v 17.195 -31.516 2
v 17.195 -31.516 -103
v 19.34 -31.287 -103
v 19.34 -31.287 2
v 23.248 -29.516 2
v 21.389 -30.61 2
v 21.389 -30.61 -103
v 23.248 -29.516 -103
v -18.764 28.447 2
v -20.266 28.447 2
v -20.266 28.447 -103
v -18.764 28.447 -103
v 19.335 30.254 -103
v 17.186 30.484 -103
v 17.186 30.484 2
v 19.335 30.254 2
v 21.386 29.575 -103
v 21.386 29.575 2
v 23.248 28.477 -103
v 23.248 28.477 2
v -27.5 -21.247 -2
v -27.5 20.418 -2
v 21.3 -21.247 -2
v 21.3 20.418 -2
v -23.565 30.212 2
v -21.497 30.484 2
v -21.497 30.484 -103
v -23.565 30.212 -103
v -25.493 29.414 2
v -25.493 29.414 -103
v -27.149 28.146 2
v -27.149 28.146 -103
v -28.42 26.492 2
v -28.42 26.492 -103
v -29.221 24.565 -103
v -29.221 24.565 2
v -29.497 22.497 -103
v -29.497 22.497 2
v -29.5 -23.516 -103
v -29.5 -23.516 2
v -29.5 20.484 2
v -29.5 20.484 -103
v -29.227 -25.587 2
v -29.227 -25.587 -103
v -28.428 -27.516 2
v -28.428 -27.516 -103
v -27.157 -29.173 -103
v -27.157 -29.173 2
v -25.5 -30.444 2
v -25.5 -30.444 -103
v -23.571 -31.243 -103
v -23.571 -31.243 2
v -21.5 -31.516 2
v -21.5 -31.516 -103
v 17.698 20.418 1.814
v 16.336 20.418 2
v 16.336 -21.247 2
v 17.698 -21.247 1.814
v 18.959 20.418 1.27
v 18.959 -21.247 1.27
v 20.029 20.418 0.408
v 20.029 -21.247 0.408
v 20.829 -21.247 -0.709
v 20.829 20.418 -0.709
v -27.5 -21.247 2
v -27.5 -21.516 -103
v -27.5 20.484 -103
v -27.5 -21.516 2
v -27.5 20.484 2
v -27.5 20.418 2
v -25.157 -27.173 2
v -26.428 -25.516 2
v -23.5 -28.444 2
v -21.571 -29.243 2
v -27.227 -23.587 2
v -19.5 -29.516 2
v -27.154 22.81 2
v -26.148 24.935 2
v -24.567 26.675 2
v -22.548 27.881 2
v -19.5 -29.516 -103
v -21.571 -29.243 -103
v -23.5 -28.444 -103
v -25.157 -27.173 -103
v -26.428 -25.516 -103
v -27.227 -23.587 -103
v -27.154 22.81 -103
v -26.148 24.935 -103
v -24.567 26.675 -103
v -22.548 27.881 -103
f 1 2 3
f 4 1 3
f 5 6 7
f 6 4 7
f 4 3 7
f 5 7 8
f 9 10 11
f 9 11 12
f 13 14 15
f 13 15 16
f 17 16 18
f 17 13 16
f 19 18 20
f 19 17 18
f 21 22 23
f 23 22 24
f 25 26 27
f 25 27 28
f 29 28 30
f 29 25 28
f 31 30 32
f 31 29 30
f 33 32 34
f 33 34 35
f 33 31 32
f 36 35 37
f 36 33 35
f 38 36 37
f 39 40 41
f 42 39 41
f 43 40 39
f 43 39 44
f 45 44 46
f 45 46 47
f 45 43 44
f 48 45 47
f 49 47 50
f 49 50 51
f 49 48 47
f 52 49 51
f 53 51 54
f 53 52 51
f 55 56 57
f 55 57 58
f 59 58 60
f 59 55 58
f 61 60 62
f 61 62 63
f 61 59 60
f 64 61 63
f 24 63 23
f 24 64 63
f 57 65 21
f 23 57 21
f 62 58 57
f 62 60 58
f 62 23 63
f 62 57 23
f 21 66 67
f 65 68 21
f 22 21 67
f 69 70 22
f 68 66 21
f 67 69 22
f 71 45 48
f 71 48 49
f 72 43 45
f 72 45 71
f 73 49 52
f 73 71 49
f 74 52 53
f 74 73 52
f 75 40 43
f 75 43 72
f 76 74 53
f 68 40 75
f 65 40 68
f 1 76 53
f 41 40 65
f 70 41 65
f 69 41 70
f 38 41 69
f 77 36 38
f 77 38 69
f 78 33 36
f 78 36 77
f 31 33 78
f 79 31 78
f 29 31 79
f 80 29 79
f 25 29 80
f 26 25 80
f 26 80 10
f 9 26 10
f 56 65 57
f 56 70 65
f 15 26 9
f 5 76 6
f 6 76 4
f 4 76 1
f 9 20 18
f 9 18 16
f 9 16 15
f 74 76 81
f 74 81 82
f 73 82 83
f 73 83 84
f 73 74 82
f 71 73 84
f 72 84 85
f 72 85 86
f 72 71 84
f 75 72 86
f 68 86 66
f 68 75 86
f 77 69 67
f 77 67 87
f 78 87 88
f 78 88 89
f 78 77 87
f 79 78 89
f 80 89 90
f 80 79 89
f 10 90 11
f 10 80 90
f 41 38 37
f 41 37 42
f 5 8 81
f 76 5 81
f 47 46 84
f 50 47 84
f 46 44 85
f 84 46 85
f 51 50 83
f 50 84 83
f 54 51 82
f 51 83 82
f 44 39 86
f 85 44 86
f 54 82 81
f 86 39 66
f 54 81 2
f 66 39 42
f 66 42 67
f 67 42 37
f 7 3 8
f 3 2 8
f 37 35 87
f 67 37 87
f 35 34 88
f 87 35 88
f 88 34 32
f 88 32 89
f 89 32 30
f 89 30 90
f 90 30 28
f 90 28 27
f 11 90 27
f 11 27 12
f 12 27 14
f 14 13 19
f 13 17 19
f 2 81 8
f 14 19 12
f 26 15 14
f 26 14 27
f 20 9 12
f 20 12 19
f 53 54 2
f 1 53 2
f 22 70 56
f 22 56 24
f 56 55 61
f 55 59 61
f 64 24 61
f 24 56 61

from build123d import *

# Parameters (mm, degrees)
F1_DEPTH    = 2
F2_DEPTH    = 103
F3_W        = 50.8
F3_H        = 41.6650772095
F4_DEPTH    = 2
F5_T1_DEPTH = 135.3099275981
F5_T3_DEPTH = 135.2654919008
F6_T1_DEPTH = 41.6650772095


# Not quite as in the source:
# - a fillet or chamfer that OpenCascade refuses, or shapes differently, is made with other operations: its cross-section is extruded or revolved along the edge and cut away or added
# - a feature names something its author has since deleted; it is built from what else it names


with BuildPart() as f1:
    # F0 (on Top) → F1 (new body)
    with BuildSketch(Plane.XY):
        with BuildLine():
            Line((23.2482, -29.5159982), (-19.5, -29.5159982))
            ThreePointArc((-19.5, -29.5159982), (-25.1568542495, -27.1728524495), (-27.5, -21.5159982))
            Line((-27.5, -21.5159982), (-27.5, 20.4840018))
            ThreePointArc((-27.5, 20.4840018), (-25.4213975047, 25.863318819), (-20.2657371023, 28.4472703934))
            Line((-20.2657371023, 28.4472703934), (-18.7638364732, 28.4472703934))
            Line((-18.7638364732, 28.4472703934), (23.2477635268, 28.4774018))
            Line((23.2477635268, 28.4774018), (23.2477635268, 30.4840018))
            Line((23.2477635268, 30.4840018), (-13.8766431592, 30.4840018))
            Line((-13.8766431592, 30.4840018), (-18.7638364732, 30.4840018))
            Line((-18.7638364732, 30.4840018), (-21.4966431592, 30.4840018))
            ThreePointArc((-21.4966431592, 30.4840018), (-27.1487639749, 28.1455855258), (-29.4966319659, 22.4973843711))
            Line((-29.4966319659, 22.4973843711), (-29.5, 20.4840018))
            Line((-29.5, 20.4840018), (-29.5, -21.5159982))
            Line((-29.5, -21.5159982), (-29.5, -23.5159982))
            ThreePointArc((-29.5, -23.5159982), (-27.1568542495, -29.1728524495), (-21.5, -31.5159982))
            Line((-21.5, -31.5159982), (-19.5, -31.5159982))
            Line((-19.5, -31.5159982), (23.2482, -31.5159982))
            Line((23.2482, -31.5159982), (23.2482, -29.5159982))
        make_face()
    extrude(amount=F1_DEPTH)

    # F0 (on Top) → F2 (join)
    with BuildSketch(Plane.XY):
        with BuildLine():
            Line((23.2482, -29.5159982), (-19.5, -29.5159982))
            ThreePointArc((-19.5, -29.5159982), (-25.1568542495, -27.1728524495), (-27.5, -21.5159982))
            Line((-27.5, -21.5159982), (-27.5, 20.4840018))
            ThreePointArc((-27.5, 20.4840018), (-25.4213975047, 25.863318819), (-20.2657371023, 28.4472703934))
            Line((-20.2657371023, 28.4472703934), (-18.7638364732, 28.4472703934))
            Line((-18.7638364732, 28.4472703934), (23.2477635268, 28.4774018))
            Line((23.2477635268, 28.4774018), (23.2477635268, 30.4840018))
            Line((23.2477635268, 30.4840018), (-13.8766431592, 30.4840018))
            Line((-13.8766431592, 30.4840018), (-18.7638364732, 30.4840018))
            Line((-18.7638364732, 30.4840018), (-21.4966431592, 30.4840018))
            ThreePointArc((-21.4966431592, 30.4840018), (-27.1487639749, 28.1455855258), (-29.4966319659, 22.4973843711))
            Line((-29.4966319659, 22.4973843711), (-29.5, 20.4840018))
            Line((-29.5, 20.4840018), (-29.5, -21.5159982))
            Line((-29.5, -21.5159982), (-29.5, -23.5159982))
            ThreePointArc((-29.5, -23.5159982), (-27.1568542495, -29.1728524495), (-21.5, -31.5159982))
            Line((-21.5, -31.5159982), (-19.5, -31.5159982))
            Line((-19.5, -31.5159982), (23.2482, -31.5159982))
            Line((23.2482, -31.5159982), (23.2482, -29.5159982))
        make_face()
    extrude(amount=-F2_DEPTH)

    # F3 (on Top) → F4 (join, symmetric)
    with BuildSketch(Plane.XY):
        with Locations((-4.1, -0.4146657884)):
            Rectangle(F3_W, F3_H)
    extrude(amount=F4_DEPTH, both=True)

    # F5: fillet of radius 10.16 on 2 edges, made by hand

    # F5_s2 → F5_t1 (cut)
    with BuildSketch(Plane.XY.offset(-118.154963799)):
        with BuildLine():
            ThreePointArc((17.1857780072, 30.4840018), (20.3785085, 29.9693152734), (23.2477635268, 28.4774018))
            Line((23.2477635268, 28.4774018), (23.2477635268, 30.4840018))
            Line((23.2477635268, 30.4840018), (17.1857780072, 30.4840018))
        make_face()
    extrude(amount=F5_T1_DEPTH, mode=Mode.SUBTRACT)

    # F5_s4 → F5_t3 (cut)
    with BuildSketch(Plane.XY.offset(-118.1327459504)):
        with BuildLine():
            ThreePointArc((17.1951016198, -31.5159982), (20.3825771099, -31.003049563), (23.2482, -29.5159982))
            Line((23.2482, -29.5159982), (23.2482, -31.5159982))
            Line((23.2482, -31.5159982), (17.1951016198, -31.5159982))
        make_face()
    extrude(amount=F5_T3_DEPTH, mode=Mode.SUBTRACT)

    # F6: fillet of radius 5.08 on 1 edges, made by hand

    # F6_s2 → F6_t1 (cut)
    with BuildSketch(Plane.XZ.offset(-20.4178728163)):
        with BuildLine():
            ThreePointArc((16.3361305416, 2), (19.5236060317, 0.8755530587), (21.3, -2))
            Line((21.3, -2), (21.3, 2))
            Line((21.3, 2), (16.3361305416, 2))
        make_face()
    extrude(amount=F6_T1_DEPTH, mode=Mode.SUBTRACT)


solid = f1.part
